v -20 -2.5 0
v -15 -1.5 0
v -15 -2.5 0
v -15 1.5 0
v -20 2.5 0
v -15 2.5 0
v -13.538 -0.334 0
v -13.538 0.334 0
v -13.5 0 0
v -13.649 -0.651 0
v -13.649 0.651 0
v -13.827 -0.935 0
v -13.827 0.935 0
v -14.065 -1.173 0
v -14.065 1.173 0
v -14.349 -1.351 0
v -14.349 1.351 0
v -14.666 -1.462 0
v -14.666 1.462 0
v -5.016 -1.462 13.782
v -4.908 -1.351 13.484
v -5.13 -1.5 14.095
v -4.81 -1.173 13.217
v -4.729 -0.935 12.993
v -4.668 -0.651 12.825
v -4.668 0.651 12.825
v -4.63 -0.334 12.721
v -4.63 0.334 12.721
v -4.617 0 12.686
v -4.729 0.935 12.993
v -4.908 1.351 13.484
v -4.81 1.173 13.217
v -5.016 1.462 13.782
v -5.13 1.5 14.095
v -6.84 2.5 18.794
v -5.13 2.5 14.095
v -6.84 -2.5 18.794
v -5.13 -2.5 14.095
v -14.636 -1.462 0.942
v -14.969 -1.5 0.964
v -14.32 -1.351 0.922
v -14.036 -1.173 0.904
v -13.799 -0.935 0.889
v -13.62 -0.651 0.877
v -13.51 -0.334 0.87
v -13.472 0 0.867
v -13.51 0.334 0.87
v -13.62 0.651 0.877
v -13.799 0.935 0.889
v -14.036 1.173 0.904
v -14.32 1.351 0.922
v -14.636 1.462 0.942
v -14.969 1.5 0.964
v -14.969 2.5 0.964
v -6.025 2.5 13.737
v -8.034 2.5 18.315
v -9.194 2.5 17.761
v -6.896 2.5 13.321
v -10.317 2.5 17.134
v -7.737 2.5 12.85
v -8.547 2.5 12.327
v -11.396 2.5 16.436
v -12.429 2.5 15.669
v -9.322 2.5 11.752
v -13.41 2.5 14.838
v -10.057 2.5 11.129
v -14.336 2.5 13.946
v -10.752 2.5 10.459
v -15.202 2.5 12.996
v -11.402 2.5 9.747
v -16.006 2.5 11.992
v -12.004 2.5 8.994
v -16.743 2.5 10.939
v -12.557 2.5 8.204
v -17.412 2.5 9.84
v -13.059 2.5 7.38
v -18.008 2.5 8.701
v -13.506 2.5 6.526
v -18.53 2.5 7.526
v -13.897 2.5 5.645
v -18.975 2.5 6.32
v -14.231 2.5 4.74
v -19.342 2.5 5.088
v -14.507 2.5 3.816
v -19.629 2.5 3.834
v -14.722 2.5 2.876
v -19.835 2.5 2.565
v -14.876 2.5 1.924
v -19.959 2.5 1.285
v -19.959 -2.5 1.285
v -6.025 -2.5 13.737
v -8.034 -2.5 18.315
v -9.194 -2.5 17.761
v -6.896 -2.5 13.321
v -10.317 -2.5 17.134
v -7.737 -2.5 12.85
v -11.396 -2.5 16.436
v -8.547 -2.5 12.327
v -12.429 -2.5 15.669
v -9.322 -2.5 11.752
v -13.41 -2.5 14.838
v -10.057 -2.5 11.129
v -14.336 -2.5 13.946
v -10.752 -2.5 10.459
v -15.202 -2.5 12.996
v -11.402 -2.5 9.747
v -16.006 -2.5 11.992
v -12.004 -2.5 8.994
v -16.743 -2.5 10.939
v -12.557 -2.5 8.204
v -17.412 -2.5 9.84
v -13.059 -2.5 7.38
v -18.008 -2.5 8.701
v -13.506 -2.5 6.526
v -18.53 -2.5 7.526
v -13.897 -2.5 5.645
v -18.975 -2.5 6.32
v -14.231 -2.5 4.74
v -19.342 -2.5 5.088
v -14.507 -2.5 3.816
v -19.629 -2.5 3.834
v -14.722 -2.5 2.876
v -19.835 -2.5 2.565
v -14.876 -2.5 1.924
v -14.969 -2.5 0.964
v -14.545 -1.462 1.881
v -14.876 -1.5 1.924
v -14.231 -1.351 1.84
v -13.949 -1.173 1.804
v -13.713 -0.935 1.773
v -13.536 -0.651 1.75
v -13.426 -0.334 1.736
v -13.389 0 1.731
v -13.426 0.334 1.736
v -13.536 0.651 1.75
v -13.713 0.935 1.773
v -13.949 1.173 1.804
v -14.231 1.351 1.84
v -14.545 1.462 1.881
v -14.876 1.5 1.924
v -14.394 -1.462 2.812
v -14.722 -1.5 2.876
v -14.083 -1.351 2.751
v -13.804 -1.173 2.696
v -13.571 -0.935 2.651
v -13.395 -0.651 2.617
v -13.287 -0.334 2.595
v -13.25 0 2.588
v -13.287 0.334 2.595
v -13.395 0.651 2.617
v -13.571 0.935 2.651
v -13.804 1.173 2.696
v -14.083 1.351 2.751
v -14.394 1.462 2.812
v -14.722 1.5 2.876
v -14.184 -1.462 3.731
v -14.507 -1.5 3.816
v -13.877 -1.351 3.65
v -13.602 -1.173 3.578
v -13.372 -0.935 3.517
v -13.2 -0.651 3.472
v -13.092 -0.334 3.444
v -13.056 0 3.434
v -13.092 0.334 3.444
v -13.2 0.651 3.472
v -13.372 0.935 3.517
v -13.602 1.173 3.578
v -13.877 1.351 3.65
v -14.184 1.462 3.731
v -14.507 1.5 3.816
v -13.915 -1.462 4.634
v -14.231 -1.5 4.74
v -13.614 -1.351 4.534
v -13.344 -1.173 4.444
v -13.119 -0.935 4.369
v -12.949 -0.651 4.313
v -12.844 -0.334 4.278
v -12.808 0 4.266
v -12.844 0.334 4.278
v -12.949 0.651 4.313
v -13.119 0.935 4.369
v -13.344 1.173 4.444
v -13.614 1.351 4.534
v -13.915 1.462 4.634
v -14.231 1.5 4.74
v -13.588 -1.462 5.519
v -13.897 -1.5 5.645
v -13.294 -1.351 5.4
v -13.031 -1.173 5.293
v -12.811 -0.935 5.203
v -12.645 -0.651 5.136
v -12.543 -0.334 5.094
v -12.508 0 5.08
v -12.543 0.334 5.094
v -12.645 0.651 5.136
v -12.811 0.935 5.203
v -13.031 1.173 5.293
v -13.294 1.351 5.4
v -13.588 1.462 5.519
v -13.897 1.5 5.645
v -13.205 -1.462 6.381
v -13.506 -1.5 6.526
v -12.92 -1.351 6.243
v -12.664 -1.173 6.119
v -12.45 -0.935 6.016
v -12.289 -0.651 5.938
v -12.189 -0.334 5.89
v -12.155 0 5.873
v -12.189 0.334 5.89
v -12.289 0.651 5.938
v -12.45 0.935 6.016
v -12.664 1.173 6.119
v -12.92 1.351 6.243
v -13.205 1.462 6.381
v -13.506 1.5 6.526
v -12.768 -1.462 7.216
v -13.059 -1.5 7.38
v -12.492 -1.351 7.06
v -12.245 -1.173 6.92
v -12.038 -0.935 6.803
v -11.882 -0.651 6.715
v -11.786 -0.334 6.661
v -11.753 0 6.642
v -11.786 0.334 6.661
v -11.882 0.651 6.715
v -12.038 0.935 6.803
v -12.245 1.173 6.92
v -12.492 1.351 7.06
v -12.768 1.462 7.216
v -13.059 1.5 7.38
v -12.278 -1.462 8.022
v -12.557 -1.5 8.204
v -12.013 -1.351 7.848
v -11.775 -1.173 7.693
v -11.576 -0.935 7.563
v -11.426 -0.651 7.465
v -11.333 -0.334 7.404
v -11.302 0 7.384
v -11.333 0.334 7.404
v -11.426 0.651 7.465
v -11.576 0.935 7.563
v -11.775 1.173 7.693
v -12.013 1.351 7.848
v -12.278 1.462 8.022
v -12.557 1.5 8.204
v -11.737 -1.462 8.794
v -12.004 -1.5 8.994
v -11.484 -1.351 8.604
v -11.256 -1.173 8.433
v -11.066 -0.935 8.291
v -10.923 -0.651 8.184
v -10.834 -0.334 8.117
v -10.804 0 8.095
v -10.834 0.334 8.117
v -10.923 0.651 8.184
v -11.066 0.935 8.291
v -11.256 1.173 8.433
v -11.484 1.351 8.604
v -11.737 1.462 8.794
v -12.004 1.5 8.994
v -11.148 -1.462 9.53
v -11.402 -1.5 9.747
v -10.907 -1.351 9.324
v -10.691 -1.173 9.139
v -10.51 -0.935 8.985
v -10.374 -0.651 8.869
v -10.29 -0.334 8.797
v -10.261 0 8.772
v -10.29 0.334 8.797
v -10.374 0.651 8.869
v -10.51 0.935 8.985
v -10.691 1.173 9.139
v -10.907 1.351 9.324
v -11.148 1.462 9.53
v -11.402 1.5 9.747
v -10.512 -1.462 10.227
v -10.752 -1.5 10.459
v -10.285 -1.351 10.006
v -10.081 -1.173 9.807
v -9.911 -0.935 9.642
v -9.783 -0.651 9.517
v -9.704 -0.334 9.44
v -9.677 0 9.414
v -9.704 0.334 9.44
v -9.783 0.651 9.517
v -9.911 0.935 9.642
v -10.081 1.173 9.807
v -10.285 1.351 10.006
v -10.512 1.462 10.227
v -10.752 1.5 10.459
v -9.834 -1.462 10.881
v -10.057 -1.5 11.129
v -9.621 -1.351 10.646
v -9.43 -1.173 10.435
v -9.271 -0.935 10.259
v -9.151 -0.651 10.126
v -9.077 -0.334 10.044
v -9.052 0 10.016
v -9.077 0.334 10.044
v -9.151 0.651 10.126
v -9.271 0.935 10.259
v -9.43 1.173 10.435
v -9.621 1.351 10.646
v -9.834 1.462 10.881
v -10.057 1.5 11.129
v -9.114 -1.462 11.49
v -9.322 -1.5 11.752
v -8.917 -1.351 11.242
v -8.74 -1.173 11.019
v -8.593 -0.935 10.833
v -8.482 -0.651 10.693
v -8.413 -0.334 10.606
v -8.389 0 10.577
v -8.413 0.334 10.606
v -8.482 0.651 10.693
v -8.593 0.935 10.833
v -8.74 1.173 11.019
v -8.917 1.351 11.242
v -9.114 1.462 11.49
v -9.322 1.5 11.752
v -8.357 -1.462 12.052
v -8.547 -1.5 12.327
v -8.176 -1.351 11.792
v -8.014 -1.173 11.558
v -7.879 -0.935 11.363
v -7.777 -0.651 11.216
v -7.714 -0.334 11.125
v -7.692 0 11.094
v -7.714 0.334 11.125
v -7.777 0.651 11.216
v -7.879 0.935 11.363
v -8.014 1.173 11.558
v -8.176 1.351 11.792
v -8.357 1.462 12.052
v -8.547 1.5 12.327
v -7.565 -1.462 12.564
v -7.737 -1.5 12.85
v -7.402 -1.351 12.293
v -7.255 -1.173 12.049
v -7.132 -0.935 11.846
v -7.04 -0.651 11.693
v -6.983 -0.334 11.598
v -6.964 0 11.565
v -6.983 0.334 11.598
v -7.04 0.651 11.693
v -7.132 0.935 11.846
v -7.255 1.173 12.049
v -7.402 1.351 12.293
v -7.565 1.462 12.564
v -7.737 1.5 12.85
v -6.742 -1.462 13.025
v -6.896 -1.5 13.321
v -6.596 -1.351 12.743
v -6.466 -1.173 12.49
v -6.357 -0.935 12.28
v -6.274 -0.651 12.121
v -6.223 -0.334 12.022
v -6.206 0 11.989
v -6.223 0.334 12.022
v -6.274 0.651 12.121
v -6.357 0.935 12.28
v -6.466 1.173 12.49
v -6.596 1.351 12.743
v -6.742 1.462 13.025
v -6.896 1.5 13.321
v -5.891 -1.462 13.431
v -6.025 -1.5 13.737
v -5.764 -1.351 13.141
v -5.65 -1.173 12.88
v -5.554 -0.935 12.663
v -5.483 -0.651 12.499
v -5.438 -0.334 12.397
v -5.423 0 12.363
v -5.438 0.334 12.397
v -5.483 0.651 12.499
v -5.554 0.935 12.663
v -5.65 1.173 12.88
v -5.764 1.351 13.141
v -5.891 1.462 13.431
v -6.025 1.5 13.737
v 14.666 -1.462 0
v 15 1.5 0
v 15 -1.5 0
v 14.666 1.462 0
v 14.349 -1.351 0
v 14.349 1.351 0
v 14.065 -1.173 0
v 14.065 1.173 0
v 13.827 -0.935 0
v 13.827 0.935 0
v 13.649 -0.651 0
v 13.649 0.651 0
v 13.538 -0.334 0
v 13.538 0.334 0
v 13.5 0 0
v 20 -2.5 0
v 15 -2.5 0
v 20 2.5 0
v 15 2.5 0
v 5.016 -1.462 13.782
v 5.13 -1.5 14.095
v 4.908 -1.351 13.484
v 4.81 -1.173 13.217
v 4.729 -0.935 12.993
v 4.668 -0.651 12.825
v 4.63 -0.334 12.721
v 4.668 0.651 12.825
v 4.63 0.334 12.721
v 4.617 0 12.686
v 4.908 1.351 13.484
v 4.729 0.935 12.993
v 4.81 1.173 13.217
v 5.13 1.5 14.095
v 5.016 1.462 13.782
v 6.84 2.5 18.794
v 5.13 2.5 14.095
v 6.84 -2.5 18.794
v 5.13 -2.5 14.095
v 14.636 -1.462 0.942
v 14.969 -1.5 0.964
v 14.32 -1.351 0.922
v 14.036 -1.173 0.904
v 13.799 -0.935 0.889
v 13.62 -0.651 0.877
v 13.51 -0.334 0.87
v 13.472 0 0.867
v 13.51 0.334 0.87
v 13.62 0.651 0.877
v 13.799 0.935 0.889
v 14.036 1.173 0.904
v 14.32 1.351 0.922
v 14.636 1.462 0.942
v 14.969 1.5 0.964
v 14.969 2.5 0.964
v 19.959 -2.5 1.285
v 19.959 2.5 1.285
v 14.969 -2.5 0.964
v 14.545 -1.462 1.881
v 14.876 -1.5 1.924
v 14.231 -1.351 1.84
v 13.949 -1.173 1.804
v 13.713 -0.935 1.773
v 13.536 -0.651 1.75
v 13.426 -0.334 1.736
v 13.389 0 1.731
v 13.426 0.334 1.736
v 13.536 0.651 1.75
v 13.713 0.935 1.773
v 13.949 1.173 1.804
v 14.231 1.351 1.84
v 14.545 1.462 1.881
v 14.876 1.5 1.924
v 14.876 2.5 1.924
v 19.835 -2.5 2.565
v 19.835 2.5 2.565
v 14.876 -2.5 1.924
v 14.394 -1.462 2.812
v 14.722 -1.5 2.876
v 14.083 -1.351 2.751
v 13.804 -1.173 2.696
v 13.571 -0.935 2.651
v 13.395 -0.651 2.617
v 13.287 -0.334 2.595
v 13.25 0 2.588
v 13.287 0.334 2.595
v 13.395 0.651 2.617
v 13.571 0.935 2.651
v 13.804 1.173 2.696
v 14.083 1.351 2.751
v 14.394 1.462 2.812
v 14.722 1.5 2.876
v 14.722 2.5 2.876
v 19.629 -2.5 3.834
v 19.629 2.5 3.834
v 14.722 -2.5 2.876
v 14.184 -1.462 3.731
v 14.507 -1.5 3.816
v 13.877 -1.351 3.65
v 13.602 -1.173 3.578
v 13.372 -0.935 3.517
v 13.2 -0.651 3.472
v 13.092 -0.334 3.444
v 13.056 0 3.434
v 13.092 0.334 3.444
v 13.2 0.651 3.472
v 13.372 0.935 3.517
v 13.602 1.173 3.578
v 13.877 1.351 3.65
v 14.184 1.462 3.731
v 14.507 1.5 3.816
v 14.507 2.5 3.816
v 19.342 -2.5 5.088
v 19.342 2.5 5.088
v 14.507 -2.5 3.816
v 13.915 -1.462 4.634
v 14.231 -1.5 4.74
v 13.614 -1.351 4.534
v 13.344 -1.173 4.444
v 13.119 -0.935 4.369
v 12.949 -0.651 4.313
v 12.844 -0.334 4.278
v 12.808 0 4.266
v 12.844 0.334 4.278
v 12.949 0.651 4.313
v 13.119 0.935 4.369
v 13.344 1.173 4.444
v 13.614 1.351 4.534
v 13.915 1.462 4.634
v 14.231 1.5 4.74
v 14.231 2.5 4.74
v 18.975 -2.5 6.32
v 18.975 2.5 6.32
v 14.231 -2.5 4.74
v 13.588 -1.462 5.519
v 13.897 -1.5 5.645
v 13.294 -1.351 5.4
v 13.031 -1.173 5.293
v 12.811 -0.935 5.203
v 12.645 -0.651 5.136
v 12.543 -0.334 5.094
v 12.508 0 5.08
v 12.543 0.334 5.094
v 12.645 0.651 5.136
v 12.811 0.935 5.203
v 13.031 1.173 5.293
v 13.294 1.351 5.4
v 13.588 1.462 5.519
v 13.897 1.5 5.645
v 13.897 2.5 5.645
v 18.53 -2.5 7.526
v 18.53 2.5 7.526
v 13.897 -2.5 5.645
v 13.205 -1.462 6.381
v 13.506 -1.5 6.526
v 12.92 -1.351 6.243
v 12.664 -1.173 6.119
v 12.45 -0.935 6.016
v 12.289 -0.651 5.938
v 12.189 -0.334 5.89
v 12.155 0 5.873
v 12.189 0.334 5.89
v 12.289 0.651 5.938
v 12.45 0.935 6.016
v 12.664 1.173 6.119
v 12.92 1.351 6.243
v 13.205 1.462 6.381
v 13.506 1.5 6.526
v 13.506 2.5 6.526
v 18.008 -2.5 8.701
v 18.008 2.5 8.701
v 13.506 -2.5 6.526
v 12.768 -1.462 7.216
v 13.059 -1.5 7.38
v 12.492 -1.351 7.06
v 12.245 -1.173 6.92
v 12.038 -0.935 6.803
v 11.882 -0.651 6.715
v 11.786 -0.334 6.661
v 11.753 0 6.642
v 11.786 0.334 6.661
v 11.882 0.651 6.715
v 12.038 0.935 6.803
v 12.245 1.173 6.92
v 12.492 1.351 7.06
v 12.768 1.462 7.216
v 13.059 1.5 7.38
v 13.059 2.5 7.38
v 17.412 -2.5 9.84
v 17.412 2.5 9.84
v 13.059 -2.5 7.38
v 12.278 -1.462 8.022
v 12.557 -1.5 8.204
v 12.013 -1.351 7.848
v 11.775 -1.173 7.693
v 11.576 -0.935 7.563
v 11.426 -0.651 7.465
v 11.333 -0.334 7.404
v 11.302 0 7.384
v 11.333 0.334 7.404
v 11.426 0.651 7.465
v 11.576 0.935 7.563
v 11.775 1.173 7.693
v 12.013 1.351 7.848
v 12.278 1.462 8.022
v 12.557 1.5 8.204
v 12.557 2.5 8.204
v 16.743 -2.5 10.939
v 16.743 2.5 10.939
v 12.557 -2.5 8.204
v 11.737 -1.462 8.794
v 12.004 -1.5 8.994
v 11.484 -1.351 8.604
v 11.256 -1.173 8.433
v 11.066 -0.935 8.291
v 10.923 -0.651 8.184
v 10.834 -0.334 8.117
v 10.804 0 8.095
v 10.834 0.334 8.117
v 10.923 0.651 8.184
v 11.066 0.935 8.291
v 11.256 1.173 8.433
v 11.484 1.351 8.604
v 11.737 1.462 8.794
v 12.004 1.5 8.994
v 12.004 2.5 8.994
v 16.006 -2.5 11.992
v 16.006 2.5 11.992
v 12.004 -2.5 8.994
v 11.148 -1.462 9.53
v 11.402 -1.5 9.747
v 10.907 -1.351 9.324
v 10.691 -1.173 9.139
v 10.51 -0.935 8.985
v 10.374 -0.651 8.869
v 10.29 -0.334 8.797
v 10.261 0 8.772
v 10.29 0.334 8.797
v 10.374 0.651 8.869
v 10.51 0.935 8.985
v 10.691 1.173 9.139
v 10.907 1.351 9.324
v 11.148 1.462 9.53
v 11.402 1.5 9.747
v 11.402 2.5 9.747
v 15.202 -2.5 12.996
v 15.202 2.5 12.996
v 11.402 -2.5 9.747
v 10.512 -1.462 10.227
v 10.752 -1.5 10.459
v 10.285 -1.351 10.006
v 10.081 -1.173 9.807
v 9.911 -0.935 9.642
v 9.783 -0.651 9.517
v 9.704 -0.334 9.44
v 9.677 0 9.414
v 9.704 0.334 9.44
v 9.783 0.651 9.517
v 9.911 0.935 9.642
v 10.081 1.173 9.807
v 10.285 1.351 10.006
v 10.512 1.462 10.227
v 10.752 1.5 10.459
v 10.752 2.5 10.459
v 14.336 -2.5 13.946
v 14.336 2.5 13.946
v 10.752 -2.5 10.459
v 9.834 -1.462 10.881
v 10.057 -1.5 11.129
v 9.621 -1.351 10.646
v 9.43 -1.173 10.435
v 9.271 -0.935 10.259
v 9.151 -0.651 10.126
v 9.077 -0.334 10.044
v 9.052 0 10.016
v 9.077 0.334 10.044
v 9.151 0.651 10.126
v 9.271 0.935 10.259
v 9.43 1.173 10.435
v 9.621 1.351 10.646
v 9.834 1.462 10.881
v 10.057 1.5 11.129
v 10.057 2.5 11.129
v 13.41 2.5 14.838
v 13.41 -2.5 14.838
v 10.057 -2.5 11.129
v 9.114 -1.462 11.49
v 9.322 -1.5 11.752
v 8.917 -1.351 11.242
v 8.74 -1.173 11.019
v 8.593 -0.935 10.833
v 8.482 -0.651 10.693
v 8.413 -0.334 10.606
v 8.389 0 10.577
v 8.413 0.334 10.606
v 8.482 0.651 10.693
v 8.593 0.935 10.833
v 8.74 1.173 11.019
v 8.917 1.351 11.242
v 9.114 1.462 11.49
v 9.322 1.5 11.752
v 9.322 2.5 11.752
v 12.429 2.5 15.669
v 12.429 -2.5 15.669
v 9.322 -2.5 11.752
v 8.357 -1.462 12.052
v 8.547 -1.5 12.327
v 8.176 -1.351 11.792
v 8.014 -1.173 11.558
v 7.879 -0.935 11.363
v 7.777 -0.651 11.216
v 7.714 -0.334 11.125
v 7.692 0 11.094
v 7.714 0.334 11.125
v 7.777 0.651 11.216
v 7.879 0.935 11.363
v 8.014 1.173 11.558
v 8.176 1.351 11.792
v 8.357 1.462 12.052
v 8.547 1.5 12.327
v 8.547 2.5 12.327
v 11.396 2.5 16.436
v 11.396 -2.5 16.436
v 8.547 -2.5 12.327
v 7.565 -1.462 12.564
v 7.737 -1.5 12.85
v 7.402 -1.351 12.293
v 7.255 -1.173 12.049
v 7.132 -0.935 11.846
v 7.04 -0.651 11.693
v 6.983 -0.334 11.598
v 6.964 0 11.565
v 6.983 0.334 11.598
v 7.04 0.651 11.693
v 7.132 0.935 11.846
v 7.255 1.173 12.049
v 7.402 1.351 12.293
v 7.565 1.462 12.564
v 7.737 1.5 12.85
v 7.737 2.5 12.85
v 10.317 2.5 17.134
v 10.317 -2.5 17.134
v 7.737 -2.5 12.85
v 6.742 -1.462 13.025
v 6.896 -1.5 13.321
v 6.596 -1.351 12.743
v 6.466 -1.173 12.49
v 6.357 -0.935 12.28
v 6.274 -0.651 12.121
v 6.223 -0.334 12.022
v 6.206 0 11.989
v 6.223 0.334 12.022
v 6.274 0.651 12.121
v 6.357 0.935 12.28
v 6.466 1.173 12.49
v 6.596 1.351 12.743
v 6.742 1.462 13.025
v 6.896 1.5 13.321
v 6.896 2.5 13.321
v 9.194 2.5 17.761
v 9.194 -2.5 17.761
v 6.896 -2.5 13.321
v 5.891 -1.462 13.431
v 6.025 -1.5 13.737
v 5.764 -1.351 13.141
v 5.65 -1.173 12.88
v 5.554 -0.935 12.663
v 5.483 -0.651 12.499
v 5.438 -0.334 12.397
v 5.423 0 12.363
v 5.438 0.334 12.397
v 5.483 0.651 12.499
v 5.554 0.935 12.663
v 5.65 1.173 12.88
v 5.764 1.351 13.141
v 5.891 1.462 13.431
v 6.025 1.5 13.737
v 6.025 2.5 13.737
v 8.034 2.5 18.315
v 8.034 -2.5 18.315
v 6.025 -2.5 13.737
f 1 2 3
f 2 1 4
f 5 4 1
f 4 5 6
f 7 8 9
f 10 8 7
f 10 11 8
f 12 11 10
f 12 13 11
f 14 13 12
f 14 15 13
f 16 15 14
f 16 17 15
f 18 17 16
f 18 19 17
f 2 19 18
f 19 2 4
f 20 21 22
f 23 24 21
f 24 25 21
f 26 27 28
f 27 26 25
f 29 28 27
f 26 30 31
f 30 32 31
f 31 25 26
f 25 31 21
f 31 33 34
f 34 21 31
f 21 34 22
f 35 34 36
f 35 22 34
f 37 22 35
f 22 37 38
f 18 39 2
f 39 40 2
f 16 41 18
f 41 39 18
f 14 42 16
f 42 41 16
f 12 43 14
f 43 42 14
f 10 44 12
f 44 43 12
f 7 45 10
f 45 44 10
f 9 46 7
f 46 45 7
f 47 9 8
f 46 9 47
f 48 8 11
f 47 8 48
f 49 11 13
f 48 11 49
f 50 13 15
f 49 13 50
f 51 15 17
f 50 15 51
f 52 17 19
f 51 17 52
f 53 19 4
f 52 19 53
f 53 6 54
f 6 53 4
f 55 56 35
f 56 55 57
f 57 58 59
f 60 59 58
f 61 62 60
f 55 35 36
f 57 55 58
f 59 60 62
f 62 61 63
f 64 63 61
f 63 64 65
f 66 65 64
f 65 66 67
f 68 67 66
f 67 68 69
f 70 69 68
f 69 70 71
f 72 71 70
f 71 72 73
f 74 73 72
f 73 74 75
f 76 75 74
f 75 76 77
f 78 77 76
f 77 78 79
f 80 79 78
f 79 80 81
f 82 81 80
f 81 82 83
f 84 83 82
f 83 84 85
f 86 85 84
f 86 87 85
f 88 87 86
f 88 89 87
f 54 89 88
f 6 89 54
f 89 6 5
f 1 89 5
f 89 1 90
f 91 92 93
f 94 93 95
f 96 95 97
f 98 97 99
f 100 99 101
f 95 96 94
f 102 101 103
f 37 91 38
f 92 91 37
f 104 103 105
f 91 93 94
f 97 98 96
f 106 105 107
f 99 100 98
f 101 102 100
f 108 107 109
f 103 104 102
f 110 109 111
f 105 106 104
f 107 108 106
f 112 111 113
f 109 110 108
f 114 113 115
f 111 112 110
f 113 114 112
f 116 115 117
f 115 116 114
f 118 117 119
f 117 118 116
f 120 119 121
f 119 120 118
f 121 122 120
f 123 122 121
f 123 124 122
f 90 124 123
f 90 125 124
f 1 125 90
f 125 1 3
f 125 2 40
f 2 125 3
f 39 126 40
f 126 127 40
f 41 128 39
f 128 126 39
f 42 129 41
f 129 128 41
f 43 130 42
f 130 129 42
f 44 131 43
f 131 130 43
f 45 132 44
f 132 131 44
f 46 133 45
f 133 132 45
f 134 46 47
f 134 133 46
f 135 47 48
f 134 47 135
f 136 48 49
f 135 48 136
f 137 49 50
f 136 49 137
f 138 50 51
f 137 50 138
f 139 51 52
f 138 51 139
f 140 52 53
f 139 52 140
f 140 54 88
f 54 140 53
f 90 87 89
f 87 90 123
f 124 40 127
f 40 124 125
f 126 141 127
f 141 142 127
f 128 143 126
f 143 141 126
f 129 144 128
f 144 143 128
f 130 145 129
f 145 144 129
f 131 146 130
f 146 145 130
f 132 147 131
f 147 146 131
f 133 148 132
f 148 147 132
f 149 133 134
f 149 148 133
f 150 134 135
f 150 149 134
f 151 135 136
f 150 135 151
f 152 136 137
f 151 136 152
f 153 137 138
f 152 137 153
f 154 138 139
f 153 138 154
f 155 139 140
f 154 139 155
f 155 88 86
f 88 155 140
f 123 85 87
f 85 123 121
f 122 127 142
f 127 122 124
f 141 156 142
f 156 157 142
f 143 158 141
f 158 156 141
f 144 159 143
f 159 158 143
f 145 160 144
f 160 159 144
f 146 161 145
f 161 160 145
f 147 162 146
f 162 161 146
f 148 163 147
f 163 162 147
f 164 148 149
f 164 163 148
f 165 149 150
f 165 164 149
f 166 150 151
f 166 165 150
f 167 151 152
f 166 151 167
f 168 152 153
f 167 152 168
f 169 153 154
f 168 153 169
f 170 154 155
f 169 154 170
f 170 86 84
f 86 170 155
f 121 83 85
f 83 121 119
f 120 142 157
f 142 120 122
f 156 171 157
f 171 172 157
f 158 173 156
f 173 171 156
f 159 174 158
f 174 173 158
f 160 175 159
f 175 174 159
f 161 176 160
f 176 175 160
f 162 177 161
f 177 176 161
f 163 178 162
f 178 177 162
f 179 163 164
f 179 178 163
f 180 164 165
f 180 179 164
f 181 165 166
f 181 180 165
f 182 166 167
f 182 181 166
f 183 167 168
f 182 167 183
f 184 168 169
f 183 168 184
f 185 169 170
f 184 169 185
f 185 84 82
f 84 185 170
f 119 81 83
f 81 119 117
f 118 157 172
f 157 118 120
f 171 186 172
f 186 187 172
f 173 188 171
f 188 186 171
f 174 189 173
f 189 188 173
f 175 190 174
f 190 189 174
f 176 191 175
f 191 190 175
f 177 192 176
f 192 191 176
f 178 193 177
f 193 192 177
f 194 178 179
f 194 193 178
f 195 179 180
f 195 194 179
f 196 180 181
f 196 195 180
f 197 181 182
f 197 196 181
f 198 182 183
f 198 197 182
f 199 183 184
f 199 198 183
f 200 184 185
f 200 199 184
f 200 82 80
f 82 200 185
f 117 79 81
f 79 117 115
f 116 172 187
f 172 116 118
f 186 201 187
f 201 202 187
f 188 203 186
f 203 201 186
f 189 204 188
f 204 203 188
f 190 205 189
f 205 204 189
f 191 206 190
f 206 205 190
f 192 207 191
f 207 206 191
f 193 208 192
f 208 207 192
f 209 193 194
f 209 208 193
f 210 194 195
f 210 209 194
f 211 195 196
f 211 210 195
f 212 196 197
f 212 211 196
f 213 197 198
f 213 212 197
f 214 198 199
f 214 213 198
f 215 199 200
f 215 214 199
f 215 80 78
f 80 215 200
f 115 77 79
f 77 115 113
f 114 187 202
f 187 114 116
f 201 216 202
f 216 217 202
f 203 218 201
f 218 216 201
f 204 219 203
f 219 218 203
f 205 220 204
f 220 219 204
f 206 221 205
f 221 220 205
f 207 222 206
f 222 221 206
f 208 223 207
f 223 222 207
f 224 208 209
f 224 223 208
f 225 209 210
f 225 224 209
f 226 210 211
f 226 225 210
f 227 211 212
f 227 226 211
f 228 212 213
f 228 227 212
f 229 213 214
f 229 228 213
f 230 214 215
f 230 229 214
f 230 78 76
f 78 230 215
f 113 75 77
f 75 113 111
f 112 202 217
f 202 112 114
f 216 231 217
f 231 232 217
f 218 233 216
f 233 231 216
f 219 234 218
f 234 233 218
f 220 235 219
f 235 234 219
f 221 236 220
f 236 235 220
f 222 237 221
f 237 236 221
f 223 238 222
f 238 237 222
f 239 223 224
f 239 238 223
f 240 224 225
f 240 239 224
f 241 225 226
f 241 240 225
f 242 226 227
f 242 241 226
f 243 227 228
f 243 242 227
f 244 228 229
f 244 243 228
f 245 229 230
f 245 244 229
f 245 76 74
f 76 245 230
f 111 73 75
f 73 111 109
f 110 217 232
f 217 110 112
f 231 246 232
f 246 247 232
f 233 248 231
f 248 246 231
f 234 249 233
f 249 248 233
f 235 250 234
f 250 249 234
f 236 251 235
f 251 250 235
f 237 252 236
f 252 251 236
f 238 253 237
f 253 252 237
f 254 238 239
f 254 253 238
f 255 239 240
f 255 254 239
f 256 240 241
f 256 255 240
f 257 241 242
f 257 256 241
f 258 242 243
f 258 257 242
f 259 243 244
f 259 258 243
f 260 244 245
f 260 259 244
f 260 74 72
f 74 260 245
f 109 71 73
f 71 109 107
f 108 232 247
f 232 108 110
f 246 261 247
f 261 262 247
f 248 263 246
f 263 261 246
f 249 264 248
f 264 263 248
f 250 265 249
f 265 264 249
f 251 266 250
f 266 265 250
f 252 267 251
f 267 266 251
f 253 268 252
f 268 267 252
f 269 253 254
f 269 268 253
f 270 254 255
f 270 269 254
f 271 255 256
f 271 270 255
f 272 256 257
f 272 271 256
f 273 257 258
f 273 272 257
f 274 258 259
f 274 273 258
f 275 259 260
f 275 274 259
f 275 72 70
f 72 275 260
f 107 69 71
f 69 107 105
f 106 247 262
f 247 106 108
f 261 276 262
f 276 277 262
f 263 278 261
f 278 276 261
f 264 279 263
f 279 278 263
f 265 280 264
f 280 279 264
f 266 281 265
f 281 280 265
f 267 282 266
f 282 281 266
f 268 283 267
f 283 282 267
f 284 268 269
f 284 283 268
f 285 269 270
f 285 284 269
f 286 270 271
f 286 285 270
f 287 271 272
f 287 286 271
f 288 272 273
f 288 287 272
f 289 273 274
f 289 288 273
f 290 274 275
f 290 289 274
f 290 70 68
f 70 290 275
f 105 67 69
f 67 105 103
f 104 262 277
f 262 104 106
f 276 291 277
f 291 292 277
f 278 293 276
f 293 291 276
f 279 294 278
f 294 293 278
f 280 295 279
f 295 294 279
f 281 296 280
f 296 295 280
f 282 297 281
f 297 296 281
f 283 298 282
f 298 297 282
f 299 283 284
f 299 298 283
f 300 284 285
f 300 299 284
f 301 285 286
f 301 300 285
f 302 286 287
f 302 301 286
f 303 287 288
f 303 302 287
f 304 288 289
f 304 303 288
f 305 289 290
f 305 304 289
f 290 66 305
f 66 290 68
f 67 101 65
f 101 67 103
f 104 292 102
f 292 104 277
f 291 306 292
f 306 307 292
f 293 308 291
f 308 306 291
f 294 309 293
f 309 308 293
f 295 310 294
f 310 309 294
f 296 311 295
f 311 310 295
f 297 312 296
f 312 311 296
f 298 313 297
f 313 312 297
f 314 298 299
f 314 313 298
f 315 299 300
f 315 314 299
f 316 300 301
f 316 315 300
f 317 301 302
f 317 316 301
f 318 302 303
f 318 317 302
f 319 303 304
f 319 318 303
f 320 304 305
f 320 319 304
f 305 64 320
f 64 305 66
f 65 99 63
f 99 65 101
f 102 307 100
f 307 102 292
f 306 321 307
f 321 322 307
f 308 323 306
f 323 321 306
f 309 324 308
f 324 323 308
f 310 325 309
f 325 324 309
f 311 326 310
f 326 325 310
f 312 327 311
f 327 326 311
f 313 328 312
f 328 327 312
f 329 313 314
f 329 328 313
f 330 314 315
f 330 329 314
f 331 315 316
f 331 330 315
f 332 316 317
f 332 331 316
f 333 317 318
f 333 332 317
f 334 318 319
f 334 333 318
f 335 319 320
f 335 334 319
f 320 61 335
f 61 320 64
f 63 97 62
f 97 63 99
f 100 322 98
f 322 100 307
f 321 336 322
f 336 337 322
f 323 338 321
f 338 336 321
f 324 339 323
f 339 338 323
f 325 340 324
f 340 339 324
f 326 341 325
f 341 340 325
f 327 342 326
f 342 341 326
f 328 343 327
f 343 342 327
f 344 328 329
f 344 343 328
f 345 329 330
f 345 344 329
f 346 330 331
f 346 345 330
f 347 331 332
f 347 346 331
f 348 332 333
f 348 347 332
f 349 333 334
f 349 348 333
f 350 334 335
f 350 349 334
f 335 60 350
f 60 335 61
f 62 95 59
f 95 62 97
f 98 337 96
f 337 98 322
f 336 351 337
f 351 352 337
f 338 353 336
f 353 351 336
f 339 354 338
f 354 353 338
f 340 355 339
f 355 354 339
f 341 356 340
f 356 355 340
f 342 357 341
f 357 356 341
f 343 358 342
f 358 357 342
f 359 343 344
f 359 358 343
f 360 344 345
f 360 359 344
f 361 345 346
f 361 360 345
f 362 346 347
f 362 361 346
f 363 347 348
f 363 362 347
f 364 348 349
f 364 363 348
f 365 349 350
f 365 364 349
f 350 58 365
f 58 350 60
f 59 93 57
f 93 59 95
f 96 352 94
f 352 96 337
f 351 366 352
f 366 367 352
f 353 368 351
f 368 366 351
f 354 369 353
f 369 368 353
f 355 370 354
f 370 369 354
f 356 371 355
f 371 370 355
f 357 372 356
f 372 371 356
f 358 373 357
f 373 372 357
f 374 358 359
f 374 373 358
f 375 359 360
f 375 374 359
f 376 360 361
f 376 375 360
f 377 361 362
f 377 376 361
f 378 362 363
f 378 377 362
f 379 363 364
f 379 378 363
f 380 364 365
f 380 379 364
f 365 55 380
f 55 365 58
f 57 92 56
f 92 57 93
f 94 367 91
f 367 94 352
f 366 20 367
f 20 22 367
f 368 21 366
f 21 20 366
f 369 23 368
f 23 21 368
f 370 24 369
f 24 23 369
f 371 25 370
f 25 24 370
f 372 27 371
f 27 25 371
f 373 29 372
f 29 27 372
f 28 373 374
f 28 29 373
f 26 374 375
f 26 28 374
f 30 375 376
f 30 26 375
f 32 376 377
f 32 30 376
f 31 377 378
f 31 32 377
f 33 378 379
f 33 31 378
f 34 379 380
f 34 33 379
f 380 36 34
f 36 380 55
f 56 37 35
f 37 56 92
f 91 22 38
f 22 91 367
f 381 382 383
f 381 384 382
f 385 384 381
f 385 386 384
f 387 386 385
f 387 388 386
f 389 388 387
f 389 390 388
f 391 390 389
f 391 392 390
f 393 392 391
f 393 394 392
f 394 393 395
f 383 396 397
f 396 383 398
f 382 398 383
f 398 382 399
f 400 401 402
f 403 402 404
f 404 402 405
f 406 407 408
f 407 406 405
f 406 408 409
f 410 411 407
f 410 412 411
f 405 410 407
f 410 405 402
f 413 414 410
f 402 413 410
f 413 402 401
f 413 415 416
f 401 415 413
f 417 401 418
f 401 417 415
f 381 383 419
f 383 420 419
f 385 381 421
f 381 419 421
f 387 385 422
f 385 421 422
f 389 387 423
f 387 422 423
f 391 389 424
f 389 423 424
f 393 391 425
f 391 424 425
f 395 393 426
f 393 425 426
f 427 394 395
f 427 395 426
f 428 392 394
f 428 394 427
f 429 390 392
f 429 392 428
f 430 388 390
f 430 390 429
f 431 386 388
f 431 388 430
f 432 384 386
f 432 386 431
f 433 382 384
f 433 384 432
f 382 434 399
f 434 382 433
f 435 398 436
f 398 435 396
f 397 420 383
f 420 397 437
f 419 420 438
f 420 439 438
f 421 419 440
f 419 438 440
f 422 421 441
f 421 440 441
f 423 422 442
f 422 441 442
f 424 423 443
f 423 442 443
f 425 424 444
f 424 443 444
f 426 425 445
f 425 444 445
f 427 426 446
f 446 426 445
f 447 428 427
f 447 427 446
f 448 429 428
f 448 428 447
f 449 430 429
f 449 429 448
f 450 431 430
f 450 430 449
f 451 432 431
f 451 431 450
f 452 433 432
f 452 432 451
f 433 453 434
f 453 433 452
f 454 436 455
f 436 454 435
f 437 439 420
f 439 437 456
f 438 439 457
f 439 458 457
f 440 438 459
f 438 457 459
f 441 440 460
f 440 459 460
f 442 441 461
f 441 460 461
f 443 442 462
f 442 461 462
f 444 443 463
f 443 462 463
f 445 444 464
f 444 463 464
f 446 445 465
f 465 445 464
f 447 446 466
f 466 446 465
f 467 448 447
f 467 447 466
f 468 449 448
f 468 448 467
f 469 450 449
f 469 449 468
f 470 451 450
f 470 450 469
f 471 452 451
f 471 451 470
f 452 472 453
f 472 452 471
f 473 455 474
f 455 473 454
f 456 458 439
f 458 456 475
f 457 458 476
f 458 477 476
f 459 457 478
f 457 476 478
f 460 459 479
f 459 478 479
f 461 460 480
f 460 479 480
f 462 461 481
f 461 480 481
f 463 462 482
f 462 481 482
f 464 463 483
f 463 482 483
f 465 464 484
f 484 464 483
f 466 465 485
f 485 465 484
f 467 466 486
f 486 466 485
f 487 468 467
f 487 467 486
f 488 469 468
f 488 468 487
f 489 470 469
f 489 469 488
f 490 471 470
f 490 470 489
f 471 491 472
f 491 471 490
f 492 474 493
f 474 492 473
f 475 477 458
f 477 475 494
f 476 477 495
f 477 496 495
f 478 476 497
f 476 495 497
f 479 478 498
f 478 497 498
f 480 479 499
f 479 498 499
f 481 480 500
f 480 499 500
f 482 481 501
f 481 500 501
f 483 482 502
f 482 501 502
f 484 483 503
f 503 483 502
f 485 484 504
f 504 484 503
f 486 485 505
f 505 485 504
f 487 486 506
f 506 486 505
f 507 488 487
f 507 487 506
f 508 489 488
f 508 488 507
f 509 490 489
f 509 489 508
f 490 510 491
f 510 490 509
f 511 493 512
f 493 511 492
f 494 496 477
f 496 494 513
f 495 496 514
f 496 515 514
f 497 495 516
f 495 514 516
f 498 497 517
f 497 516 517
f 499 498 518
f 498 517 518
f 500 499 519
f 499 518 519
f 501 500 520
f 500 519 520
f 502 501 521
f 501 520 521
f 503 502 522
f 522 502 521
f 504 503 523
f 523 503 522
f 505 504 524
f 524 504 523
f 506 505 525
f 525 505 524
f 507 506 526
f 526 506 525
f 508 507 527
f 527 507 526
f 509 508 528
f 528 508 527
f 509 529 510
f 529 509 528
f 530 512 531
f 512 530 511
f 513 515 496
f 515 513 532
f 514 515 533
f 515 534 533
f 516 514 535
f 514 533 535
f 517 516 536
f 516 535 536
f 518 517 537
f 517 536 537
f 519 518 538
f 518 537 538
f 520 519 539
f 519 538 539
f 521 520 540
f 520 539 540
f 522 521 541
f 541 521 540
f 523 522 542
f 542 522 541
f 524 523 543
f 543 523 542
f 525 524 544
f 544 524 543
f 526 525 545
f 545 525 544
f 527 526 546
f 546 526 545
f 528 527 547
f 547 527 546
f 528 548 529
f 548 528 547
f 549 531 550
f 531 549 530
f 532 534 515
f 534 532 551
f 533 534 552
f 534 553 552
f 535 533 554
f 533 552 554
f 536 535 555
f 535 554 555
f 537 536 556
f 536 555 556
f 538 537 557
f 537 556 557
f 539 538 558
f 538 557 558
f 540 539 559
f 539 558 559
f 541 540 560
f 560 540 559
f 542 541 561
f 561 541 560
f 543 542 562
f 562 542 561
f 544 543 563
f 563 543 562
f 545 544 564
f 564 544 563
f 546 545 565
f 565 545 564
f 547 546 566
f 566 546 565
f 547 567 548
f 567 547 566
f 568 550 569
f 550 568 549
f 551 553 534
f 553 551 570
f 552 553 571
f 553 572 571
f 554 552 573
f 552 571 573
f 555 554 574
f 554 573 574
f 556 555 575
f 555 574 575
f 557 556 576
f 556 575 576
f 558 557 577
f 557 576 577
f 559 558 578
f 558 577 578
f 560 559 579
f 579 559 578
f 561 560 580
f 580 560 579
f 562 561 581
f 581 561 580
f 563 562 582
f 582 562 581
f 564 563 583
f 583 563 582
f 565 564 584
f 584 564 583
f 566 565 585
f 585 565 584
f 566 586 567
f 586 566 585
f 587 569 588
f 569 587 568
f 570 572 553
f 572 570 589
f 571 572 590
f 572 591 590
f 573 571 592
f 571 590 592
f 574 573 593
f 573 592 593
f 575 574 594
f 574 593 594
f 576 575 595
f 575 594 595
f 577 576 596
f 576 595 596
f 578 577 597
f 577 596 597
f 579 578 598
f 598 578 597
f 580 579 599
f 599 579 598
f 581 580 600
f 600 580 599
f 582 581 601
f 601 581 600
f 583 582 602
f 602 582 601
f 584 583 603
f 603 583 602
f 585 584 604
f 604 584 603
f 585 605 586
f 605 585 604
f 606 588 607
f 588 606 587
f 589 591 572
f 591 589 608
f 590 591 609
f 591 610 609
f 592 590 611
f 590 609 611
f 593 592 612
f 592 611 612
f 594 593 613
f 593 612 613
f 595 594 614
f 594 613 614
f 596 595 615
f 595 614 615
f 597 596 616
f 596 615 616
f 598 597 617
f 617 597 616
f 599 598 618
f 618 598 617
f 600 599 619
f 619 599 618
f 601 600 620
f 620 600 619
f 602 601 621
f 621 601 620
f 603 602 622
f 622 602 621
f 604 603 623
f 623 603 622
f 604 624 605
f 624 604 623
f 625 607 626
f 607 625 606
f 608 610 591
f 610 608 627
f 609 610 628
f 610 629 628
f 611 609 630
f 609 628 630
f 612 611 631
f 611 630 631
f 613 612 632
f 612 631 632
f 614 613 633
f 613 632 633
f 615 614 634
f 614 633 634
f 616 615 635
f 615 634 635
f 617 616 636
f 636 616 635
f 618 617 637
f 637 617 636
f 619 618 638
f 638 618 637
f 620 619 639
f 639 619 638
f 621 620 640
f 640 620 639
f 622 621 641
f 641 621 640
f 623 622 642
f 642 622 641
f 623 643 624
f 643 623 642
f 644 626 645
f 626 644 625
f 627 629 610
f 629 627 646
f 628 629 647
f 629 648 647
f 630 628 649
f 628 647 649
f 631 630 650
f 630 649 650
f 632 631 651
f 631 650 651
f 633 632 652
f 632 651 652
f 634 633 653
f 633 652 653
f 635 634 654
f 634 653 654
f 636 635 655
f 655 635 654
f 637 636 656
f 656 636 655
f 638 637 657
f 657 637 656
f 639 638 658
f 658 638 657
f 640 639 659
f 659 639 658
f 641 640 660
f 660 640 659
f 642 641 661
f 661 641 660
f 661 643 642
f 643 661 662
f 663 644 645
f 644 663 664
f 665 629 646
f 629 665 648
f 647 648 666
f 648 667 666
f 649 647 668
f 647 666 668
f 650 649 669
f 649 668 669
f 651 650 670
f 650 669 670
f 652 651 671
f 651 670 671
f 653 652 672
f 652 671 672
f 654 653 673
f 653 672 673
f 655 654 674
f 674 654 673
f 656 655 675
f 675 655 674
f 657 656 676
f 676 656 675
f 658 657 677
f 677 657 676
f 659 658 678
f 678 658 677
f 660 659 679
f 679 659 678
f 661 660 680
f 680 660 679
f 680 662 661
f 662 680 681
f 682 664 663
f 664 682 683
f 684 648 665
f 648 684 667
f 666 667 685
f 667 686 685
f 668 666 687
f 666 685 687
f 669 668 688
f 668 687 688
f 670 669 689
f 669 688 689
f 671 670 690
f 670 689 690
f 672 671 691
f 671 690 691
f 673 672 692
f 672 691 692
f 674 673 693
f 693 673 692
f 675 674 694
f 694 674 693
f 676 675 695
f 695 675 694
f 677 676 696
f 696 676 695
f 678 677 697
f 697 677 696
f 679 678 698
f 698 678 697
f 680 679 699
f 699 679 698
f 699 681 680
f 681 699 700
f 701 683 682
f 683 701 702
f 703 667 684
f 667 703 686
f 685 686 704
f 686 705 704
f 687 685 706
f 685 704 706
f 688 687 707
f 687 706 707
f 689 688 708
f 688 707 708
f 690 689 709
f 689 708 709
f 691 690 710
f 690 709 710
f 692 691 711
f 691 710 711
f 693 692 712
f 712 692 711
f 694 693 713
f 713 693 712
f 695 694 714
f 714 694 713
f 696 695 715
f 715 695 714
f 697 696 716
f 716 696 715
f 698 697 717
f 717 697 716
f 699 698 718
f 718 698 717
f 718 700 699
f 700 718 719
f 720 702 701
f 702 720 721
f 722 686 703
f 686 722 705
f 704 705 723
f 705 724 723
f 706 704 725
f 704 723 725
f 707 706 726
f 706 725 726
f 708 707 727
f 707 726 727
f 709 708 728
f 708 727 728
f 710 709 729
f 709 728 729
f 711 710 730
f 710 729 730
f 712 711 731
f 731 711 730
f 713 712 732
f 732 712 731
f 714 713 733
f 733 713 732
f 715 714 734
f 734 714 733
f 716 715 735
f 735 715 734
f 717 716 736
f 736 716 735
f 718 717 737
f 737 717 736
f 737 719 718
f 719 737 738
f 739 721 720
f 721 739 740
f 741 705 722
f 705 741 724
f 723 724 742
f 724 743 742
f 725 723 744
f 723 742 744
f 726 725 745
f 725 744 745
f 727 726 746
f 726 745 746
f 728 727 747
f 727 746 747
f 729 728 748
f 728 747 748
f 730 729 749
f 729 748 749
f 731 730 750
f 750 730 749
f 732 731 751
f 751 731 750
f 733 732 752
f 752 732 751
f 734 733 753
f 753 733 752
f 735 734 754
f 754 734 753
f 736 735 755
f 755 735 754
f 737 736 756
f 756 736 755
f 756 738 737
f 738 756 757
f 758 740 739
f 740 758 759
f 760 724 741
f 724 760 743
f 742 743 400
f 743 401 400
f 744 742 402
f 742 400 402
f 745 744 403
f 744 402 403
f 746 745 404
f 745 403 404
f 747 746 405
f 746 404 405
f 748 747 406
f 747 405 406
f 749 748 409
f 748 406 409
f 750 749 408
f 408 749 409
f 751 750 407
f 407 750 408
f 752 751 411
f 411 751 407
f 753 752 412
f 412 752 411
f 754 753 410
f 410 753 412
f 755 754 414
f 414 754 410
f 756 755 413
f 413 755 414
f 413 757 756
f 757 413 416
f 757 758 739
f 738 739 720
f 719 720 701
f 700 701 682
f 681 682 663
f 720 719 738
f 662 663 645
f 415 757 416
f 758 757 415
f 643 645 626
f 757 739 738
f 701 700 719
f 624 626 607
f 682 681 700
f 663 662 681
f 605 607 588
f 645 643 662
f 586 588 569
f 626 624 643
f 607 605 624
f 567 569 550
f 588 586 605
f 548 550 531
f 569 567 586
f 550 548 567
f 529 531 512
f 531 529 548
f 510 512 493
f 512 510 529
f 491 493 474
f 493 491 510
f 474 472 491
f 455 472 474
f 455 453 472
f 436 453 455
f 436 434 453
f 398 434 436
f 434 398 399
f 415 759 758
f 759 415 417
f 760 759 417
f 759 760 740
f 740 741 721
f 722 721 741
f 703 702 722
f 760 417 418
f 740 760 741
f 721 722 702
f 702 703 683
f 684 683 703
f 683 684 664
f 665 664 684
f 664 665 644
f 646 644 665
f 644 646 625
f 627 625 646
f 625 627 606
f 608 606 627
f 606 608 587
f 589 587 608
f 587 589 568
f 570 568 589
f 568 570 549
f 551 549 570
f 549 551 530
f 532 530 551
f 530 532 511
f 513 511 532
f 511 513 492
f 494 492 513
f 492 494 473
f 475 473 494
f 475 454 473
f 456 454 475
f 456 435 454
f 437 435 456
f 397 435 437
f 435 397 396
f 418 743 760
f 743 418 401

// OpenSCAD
arch_base = 5;
arch_angle = 70;
archi_radius = 20;

for (m = [0:1] )
mirror( [m, 0, 0] )
rotate( [-90, 0, 0] )
rotate_extrude( angle = arch_angle, $fn = 100)
translate( [ -archi_radius, 0 ] )
union() {
    translate( [0, -arch_base / 2] )
        square( arch_base );

    translate( [arch_base, 0])
        circle( d = arch_base * 3 / 5, $fn=28);
    }
